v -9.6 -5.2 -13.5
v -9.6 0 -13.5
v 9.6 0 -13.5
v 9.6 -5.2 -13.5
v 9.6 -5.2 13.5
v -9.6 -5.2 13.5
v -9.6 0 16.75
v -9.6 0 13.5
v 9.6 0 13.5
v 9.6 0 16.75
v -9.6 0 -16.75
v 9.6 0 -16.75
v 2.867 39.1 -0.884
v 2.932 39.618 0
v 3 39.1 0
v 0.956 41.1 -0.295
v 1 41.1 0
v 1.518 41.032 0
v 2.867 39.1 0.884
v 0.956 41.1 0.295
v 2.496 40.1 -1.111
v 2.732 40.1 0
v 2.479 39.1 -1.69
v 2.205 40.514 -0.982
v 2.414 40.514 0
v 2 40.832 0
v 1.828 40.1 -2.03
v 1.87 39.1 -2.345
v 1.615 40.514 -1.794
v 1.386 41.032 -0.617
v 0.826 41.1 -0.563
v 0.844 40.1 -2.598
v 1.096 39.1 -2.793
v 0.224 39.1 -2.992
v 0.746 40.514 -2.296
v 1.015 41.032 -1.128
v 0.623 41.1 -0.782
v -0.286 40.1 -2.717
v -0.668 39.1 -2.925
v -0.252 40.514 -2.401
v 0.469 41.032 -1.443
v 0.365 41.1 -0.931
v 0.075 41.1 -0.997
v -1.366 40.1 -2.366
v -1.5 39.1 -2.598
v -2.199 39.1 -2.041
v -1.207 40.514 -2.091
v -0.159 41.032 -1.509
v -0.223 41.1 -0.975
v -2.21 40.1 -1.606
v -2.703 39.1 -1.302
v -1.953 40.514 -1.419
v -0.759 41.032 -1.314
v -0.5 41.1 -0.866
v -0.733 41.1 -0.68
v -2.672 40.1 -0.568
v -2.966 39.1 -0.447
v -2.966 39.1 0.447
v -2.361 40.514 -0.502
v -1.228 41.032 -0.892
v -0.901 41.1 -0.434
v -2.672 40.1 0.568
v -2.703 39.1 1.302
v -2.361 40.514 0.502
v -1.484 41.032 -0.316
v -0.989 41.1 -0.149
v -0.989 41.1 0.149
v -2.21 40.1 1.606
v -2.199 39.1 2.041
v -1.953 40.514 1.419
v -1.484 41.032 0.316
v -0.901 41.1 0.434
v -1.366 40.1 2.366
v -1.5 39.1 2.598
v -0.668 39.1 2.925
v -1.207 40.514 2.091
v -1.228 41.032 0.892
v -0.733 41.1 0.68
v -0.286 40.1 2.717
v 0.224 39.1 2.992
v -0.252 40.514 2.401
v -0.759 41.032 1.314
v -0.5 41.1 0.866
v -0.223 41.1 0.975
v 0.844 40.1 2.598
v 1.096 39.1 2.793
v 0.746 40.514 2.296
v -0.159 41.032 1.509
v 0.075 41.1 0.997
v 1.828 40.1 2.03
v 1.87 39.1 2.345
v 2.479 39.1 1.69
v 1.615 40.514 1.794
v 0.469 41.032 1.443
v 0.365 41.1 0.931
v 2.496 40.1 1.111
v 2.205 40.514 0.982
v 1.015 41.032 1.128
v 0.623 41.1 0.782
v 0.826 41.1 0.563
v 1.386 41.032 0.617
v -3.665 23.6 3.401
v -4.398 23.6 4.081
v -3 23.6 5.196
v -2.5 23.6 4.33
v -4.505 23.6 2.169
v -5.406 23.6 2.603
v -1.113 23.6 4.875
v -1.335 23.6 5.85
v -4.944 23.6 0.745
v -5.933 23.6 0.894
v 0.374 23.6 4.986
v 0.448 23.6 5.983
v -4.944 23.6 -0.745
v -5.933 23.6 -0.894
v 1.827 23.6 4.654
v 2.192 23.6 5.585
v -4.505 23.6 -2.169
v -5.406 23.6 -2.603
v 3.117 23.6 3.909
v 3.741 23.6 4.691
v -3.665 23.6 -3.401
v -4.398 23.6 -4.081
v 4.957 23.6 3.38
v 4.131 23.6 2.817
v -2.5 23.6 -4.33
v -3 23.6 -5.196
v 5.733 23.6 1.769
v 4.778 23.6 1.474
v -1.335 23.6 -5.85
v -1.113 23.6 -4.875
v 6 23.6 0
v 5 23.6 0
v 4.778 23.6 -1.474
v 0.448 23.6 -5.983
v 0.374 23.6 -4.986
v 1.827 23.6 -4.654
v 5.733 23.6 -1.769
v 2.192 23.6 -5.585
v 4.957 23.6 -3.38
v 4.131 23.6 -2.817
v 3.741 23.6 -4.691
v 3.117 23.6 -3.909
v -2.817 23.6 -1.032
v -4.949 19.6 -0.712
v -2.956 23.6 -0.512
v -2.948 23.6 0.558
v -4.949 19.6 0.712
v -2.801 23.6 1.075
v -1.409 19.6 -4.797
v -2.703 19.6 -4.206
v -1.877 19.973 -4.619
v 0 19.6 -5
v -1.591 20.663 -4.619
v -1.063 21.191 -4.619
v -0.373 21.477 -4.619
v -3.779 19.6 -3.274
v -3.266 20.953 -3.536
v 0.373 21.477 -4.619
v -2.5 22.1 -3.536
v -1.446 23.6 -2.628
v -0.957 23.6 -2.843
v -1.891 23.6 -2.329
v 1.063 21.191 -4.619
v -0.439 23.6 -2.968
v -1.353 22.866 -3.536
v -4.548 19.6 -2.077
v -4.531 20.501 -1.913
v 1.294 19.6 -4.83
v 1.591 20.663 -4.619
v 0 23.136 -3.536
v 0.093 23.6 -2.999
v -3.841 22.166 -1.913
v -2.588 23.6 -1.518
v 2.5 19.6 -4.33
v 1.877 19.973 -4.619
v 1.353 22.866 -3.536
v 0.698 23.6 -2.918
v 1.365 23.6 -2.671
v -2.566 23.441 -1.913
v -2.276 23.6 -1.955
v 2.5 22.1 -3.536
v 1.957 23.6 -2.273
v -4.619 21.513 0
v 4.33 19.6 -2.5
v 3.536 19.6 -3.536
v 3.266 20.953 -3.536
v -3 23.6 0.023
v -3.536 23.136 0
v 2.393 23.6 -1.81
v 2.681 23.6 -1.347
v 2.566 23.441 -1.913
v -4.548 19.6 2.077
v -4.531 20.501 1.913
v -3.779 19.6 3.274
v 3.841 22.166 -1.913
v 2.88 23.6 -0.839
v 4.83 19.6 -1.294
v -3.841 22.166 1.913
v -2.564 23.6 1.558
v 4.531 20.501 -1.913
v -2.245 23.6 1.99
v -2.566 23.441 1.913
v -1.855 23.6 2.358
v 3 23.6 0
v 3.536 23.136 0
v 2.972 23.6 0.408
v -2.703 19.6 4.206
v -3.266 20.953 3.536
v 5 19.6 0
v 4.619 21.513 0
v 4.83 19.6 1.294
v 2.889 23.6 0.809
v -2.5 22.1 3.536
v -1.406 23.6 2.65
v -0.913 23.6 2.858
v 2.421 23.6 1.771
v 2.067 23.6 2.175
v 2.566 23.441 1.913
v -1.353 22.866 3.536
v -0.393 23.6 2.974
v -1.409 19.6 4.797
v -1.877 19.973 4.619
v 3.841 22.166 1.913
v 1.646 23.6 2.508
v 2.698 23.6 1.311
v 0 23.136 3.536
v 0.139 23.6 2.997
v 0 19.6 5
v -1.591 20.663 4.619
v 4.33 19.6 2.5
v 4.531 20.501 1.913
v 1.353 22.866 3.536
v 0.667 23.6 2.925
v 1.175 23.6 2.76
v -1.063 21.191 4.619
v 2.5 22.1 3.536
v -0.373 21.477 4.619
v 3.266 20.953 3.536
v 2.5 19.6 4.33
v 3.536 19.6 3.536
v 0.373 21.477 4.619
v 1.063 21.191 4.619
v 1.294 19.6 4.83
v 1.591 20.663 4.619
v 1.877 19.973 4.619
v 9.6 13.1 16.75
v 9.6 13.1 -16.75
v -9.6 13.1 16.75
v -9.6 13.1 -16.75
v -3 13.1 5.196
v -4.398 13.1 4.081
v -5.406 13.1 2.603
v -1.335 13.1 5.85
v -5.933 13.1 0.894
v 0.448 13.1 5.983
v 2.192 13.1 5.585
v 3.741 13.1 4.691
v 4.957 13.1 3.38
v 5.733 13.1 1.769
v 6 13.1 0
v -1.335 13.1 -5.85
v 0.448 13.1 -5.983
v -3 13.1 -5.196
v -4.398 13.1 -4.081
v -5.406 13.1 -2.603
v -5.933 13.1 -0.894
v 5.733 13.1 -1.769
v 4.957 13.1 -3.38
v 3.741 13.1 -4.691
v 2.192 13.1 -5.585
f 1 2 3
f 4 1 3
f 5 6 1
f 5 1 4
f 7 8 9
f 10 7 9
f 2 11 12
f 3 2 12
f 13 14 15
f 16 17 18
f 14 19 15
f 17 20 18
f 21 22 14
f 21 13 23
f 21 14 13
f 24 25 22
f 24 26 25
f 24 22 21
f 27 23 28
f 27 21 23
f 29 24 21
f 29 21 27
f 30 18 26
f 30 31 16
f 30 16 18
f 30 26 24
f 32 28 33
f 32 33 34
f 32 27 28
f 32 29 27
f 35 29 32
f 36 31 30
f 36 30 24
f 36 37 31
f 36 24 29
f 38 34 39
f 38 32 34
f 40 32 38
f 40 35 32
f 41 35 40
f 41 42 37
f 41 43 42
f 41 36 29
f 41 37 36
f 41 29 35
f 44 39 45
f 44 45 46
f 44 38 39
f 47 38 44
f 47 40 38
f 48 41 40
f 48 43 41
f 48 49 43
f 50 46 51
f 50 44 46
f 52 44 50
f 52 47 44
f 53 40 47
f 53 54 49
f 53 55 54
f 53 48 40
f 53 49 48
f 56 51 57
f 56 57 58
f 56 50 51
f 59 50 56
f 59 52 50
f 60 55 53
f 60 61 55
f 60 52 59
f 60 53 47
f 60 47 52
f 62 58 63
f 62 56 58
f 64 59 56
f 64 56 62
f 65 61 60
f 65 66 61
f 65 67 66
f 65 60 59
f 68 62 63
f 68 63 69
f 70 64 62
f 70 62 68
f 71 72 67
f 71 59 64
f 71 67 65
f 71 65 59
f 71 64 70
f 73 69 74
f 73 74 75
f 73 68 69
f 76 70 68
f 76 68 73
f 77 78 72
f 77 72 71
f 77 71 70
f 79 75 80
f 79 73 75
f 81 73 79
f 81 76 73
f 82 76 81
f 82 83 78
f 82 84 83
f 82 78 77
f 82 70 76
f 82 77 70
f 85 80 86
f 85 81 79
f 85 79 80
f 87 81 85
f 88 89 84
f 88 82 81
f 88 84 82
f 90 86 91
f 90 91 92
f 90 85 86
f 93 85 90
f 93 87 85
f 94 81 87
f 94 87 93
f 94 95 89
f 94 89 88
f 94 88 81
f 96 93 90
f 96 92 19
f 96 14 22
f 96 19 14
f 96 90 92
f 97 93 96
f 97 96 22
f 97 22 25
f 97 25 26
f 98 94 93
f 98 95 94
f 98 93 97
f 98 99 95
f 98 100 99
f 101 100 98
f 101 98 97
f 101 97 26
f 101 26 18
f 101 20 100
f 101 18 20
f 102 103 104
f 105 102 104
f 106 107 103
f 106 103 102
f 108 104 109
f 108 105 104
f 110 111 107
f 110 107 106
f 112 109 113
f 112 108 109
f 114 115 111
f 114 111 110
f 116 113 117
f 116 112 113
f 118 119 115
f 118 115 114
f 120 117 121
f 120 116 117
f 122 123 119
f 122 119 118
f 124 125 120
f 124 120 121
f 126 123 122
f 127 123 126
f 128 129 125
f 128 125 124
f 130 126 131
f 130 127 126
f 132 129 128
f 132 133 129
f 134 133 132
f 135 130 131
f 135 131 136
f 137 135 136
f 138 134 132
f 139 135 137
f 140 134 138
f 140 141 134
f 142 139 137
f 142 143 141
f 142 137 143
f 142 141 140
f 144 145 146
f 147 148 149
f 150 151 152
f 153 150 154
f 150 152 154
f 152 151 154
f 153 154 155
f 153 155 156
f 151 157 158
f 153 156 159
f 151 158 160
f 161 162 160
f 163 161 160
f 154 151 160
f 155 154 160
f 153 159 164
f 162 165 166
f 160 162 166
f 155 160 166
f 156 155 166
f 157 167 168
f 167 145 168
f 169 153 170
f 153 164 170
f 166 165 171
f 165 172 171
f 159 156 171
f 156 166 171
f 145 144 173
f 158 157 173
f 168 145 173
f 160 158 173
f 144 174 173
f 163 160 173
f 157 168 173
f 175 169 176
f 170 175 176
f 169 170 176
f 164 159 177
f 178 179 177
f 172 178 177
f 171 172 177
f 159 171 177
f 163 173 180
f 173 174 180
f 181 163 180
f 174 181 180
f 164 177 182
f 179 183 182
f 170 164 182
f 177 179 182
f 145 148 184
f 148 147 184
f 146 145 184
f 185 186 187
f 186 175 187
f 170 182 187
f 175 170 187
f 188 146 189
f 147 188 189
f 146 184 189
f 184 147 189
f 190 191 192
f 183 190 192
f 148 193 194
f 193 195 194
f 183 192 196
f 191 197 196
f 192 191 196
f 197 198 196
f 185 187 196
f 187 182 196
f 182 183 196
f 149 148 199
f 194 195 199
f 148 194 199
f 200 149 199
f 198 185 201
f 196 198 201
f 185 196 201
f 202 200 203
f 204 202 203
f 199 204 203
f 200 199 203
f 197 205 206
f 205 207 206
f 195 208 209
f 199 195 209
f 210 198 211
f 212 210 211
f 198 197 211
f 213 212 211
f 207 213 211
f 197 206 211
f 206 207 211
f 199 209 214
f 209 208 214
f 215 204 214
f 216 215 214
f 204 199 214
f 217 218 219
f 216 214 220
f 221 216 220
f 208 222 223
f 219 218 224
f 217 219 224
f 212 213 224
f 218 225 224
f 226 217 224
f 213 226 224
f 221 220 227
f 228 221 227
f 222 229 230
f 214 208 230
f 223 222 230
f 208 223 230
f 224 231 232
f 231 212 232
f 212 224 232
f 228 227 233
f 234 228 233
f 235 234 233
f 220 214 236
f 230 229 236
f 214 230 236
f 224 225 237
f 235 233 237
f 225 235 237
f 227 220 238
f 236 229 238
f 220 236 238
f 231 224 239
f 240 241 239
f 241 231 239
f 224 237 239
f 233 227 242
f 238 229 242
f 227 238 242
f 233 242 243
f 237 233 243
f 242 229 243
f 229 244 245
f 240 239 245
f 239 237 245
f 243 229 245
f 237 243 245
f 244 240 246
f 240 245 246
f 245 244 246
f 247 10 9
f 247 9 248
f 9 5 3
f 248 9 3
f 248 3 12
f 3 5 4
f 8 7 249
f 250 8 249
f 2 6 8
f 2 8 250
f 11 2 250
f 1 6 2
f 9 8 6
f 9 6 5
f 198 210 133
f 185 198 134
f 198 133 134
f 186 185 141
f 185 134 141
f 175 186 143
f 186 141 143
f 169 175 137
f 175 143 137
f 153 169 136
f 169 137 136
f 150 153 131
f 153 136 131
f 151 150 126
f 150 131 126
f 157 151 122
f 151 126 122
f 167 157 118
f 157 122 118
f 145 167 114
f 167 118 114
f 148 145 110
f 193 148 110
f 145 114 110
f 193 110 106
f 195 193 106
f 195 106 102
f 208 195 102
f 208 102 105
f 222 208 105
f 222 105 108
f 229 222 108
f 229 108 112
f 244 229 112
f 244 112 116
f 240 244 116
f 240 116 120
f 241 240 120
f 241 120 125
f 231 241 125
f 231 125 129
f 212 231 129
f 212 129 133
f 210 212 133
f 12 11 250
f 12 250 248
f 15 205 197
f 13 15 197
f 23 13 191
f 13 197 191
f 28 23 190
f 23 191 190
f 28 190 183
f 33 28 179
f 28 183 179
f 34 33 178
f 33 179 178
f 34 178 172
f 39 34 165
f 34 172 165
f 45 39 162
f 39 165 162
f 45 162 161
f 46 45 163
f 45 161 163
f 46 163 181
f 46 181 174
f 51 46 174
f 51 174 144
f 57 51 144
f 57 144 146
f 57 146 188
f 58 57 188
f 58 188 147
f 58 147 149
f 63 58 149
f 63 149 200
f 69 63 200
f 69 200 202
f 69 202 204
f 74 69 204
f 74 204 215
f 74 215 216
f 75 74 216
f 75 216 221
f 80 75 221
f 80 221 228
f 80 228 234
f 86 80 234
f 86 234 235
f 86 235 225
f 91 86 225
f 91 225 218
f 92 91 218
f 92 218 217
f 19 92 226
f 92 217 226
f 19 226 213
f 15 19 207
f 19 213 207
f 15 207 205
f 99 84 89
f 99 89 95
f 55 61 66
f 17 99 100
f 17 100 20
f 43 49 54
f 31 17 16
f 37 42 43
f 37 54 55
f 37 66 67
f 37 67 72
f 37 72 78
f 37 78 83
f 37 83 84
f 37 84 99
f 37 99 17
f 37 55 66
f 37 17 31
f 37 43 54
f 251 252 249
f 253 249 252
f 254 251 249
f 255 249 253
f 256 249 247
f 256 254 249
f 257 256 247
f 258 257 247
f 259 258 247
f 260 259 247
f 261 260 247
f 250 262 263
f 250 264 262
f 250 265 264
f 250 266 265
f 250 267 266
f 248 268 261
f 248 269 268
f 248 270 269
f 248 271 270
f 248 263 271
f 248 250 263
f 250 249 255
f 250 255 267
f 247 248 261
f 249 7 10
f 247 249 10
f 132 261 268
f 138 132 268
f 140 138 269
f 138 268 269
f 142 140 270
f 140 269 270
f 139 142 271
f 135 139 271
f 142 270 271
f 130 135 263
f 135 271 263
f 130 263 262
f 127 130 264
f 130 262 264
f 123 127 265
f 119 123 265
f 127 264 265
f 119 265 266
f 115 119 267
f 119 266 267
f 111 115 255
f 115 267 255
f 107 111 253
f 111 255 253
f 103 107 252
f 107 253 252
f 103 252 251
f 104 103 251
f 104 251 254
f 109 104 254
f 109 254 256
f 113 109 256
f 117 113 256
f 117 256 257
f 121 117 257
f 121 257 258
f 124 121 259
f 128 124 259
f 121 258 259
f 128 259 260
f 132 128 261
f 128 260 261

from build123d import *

# Parameters (mm, degrees)
SKETCH1_W           = 19.2
SKETCH1_H           = 33.5
BOSS_EXTRUDE1_DEPTH = 13.1
SKETCH2_R           = 6
BOSS_EXTRUDE2_DEPTH = 10.5
SKETCH4_R           = 5
CUT_EXTRUDE1_DEPTH  = 4
SKETCH5_R           = 3
BOSS_EXTRUDE3_DEPTH = 21.5
REVOLVE2_ANGLE      = 180
FILLET1_R           = 2
SKETCH6_W           = 19.2
SKETCH6_H           = 27
BOSS_EXTRUDE4_DEPTH = 5.2


with BuildPart() as part:
    # Sketch1 → Boss-Extrude1 (new body)
    with BuildSketch(Plane(origin=(0, 0, 0), x_dir=(1, 0, 0), z_dir=(0, 1, 0))):
        Rectangle(SKETCH1_W, SKETCH1_H)
    extrude(amount=BOSS_EXTRUDE1_DEPTH)

    # Sketch2 → Boss-Extrude2 (add)
    with BuildSketch(Plane(origin=(0, 13.1, 0), x_dir=(1, 0, 0), z_dir=(0, 1, 0))):
        Circle(SKETCH2_R)
    extrude(amount=BOSS_EXTRUDE2_DEPTH)

    # Sketch4 → Cut-Extrude1 (cut)
    with BuildSketch(Plane(origin=(0, 23.6, 0), x_dir=(1, 0, 0), z_dir=(0, 1, 0))):
        Circle(SKETCH4_R)
    extrude(amount=-CUT_EXTRUDE1_DEPTH, mode=Mode.SUBTRACT)

    # Sketch5 → Boss-Extrude3 (add)
    with BuildSketch(Plane(origin=(0, 19.6, 0), x_dir=(1, 0, 0), z_dir=(0, 1, 0))):
        Circle(SKETCH5_R)
    extrude(amount=BOSS_EXTRUDE3_DEPTH)

    # Sketch3 → Revolve2 (revolve)
    with BuildSketch(Plane(origin=(0, 19.6, 0), x_dir=(1, 0, 0), z_dir=(0, 1, 0))):
        with BuildLine():
            Line((0, -5), (0, 5))
            ThreePointArc((0, 5), (-5, 0), (0, -5))
        make_face()
    revolve(axis=Axis((0, 19.6, 6), (0, 0, -1)), revolution_arc=REVOLVE2_ANGLE)

    # Fillet1
    fillet1_edges = [part.edges().sort_by_distance(p)[0] for p in [
        (-3, 41.1, 0),
    ]]
    fillet(fillet1_edges, radius=FILLET1_R)

    # Sketch6 → Boss-Extrude4 (add)
    with BuildSketch(Plane.XZ):
        Rectangle(SKETCH6_W, SKETCH6_H)
    extrude(amount=BOSS_EXTRUDE4_DEPTH)


solid = part.part
